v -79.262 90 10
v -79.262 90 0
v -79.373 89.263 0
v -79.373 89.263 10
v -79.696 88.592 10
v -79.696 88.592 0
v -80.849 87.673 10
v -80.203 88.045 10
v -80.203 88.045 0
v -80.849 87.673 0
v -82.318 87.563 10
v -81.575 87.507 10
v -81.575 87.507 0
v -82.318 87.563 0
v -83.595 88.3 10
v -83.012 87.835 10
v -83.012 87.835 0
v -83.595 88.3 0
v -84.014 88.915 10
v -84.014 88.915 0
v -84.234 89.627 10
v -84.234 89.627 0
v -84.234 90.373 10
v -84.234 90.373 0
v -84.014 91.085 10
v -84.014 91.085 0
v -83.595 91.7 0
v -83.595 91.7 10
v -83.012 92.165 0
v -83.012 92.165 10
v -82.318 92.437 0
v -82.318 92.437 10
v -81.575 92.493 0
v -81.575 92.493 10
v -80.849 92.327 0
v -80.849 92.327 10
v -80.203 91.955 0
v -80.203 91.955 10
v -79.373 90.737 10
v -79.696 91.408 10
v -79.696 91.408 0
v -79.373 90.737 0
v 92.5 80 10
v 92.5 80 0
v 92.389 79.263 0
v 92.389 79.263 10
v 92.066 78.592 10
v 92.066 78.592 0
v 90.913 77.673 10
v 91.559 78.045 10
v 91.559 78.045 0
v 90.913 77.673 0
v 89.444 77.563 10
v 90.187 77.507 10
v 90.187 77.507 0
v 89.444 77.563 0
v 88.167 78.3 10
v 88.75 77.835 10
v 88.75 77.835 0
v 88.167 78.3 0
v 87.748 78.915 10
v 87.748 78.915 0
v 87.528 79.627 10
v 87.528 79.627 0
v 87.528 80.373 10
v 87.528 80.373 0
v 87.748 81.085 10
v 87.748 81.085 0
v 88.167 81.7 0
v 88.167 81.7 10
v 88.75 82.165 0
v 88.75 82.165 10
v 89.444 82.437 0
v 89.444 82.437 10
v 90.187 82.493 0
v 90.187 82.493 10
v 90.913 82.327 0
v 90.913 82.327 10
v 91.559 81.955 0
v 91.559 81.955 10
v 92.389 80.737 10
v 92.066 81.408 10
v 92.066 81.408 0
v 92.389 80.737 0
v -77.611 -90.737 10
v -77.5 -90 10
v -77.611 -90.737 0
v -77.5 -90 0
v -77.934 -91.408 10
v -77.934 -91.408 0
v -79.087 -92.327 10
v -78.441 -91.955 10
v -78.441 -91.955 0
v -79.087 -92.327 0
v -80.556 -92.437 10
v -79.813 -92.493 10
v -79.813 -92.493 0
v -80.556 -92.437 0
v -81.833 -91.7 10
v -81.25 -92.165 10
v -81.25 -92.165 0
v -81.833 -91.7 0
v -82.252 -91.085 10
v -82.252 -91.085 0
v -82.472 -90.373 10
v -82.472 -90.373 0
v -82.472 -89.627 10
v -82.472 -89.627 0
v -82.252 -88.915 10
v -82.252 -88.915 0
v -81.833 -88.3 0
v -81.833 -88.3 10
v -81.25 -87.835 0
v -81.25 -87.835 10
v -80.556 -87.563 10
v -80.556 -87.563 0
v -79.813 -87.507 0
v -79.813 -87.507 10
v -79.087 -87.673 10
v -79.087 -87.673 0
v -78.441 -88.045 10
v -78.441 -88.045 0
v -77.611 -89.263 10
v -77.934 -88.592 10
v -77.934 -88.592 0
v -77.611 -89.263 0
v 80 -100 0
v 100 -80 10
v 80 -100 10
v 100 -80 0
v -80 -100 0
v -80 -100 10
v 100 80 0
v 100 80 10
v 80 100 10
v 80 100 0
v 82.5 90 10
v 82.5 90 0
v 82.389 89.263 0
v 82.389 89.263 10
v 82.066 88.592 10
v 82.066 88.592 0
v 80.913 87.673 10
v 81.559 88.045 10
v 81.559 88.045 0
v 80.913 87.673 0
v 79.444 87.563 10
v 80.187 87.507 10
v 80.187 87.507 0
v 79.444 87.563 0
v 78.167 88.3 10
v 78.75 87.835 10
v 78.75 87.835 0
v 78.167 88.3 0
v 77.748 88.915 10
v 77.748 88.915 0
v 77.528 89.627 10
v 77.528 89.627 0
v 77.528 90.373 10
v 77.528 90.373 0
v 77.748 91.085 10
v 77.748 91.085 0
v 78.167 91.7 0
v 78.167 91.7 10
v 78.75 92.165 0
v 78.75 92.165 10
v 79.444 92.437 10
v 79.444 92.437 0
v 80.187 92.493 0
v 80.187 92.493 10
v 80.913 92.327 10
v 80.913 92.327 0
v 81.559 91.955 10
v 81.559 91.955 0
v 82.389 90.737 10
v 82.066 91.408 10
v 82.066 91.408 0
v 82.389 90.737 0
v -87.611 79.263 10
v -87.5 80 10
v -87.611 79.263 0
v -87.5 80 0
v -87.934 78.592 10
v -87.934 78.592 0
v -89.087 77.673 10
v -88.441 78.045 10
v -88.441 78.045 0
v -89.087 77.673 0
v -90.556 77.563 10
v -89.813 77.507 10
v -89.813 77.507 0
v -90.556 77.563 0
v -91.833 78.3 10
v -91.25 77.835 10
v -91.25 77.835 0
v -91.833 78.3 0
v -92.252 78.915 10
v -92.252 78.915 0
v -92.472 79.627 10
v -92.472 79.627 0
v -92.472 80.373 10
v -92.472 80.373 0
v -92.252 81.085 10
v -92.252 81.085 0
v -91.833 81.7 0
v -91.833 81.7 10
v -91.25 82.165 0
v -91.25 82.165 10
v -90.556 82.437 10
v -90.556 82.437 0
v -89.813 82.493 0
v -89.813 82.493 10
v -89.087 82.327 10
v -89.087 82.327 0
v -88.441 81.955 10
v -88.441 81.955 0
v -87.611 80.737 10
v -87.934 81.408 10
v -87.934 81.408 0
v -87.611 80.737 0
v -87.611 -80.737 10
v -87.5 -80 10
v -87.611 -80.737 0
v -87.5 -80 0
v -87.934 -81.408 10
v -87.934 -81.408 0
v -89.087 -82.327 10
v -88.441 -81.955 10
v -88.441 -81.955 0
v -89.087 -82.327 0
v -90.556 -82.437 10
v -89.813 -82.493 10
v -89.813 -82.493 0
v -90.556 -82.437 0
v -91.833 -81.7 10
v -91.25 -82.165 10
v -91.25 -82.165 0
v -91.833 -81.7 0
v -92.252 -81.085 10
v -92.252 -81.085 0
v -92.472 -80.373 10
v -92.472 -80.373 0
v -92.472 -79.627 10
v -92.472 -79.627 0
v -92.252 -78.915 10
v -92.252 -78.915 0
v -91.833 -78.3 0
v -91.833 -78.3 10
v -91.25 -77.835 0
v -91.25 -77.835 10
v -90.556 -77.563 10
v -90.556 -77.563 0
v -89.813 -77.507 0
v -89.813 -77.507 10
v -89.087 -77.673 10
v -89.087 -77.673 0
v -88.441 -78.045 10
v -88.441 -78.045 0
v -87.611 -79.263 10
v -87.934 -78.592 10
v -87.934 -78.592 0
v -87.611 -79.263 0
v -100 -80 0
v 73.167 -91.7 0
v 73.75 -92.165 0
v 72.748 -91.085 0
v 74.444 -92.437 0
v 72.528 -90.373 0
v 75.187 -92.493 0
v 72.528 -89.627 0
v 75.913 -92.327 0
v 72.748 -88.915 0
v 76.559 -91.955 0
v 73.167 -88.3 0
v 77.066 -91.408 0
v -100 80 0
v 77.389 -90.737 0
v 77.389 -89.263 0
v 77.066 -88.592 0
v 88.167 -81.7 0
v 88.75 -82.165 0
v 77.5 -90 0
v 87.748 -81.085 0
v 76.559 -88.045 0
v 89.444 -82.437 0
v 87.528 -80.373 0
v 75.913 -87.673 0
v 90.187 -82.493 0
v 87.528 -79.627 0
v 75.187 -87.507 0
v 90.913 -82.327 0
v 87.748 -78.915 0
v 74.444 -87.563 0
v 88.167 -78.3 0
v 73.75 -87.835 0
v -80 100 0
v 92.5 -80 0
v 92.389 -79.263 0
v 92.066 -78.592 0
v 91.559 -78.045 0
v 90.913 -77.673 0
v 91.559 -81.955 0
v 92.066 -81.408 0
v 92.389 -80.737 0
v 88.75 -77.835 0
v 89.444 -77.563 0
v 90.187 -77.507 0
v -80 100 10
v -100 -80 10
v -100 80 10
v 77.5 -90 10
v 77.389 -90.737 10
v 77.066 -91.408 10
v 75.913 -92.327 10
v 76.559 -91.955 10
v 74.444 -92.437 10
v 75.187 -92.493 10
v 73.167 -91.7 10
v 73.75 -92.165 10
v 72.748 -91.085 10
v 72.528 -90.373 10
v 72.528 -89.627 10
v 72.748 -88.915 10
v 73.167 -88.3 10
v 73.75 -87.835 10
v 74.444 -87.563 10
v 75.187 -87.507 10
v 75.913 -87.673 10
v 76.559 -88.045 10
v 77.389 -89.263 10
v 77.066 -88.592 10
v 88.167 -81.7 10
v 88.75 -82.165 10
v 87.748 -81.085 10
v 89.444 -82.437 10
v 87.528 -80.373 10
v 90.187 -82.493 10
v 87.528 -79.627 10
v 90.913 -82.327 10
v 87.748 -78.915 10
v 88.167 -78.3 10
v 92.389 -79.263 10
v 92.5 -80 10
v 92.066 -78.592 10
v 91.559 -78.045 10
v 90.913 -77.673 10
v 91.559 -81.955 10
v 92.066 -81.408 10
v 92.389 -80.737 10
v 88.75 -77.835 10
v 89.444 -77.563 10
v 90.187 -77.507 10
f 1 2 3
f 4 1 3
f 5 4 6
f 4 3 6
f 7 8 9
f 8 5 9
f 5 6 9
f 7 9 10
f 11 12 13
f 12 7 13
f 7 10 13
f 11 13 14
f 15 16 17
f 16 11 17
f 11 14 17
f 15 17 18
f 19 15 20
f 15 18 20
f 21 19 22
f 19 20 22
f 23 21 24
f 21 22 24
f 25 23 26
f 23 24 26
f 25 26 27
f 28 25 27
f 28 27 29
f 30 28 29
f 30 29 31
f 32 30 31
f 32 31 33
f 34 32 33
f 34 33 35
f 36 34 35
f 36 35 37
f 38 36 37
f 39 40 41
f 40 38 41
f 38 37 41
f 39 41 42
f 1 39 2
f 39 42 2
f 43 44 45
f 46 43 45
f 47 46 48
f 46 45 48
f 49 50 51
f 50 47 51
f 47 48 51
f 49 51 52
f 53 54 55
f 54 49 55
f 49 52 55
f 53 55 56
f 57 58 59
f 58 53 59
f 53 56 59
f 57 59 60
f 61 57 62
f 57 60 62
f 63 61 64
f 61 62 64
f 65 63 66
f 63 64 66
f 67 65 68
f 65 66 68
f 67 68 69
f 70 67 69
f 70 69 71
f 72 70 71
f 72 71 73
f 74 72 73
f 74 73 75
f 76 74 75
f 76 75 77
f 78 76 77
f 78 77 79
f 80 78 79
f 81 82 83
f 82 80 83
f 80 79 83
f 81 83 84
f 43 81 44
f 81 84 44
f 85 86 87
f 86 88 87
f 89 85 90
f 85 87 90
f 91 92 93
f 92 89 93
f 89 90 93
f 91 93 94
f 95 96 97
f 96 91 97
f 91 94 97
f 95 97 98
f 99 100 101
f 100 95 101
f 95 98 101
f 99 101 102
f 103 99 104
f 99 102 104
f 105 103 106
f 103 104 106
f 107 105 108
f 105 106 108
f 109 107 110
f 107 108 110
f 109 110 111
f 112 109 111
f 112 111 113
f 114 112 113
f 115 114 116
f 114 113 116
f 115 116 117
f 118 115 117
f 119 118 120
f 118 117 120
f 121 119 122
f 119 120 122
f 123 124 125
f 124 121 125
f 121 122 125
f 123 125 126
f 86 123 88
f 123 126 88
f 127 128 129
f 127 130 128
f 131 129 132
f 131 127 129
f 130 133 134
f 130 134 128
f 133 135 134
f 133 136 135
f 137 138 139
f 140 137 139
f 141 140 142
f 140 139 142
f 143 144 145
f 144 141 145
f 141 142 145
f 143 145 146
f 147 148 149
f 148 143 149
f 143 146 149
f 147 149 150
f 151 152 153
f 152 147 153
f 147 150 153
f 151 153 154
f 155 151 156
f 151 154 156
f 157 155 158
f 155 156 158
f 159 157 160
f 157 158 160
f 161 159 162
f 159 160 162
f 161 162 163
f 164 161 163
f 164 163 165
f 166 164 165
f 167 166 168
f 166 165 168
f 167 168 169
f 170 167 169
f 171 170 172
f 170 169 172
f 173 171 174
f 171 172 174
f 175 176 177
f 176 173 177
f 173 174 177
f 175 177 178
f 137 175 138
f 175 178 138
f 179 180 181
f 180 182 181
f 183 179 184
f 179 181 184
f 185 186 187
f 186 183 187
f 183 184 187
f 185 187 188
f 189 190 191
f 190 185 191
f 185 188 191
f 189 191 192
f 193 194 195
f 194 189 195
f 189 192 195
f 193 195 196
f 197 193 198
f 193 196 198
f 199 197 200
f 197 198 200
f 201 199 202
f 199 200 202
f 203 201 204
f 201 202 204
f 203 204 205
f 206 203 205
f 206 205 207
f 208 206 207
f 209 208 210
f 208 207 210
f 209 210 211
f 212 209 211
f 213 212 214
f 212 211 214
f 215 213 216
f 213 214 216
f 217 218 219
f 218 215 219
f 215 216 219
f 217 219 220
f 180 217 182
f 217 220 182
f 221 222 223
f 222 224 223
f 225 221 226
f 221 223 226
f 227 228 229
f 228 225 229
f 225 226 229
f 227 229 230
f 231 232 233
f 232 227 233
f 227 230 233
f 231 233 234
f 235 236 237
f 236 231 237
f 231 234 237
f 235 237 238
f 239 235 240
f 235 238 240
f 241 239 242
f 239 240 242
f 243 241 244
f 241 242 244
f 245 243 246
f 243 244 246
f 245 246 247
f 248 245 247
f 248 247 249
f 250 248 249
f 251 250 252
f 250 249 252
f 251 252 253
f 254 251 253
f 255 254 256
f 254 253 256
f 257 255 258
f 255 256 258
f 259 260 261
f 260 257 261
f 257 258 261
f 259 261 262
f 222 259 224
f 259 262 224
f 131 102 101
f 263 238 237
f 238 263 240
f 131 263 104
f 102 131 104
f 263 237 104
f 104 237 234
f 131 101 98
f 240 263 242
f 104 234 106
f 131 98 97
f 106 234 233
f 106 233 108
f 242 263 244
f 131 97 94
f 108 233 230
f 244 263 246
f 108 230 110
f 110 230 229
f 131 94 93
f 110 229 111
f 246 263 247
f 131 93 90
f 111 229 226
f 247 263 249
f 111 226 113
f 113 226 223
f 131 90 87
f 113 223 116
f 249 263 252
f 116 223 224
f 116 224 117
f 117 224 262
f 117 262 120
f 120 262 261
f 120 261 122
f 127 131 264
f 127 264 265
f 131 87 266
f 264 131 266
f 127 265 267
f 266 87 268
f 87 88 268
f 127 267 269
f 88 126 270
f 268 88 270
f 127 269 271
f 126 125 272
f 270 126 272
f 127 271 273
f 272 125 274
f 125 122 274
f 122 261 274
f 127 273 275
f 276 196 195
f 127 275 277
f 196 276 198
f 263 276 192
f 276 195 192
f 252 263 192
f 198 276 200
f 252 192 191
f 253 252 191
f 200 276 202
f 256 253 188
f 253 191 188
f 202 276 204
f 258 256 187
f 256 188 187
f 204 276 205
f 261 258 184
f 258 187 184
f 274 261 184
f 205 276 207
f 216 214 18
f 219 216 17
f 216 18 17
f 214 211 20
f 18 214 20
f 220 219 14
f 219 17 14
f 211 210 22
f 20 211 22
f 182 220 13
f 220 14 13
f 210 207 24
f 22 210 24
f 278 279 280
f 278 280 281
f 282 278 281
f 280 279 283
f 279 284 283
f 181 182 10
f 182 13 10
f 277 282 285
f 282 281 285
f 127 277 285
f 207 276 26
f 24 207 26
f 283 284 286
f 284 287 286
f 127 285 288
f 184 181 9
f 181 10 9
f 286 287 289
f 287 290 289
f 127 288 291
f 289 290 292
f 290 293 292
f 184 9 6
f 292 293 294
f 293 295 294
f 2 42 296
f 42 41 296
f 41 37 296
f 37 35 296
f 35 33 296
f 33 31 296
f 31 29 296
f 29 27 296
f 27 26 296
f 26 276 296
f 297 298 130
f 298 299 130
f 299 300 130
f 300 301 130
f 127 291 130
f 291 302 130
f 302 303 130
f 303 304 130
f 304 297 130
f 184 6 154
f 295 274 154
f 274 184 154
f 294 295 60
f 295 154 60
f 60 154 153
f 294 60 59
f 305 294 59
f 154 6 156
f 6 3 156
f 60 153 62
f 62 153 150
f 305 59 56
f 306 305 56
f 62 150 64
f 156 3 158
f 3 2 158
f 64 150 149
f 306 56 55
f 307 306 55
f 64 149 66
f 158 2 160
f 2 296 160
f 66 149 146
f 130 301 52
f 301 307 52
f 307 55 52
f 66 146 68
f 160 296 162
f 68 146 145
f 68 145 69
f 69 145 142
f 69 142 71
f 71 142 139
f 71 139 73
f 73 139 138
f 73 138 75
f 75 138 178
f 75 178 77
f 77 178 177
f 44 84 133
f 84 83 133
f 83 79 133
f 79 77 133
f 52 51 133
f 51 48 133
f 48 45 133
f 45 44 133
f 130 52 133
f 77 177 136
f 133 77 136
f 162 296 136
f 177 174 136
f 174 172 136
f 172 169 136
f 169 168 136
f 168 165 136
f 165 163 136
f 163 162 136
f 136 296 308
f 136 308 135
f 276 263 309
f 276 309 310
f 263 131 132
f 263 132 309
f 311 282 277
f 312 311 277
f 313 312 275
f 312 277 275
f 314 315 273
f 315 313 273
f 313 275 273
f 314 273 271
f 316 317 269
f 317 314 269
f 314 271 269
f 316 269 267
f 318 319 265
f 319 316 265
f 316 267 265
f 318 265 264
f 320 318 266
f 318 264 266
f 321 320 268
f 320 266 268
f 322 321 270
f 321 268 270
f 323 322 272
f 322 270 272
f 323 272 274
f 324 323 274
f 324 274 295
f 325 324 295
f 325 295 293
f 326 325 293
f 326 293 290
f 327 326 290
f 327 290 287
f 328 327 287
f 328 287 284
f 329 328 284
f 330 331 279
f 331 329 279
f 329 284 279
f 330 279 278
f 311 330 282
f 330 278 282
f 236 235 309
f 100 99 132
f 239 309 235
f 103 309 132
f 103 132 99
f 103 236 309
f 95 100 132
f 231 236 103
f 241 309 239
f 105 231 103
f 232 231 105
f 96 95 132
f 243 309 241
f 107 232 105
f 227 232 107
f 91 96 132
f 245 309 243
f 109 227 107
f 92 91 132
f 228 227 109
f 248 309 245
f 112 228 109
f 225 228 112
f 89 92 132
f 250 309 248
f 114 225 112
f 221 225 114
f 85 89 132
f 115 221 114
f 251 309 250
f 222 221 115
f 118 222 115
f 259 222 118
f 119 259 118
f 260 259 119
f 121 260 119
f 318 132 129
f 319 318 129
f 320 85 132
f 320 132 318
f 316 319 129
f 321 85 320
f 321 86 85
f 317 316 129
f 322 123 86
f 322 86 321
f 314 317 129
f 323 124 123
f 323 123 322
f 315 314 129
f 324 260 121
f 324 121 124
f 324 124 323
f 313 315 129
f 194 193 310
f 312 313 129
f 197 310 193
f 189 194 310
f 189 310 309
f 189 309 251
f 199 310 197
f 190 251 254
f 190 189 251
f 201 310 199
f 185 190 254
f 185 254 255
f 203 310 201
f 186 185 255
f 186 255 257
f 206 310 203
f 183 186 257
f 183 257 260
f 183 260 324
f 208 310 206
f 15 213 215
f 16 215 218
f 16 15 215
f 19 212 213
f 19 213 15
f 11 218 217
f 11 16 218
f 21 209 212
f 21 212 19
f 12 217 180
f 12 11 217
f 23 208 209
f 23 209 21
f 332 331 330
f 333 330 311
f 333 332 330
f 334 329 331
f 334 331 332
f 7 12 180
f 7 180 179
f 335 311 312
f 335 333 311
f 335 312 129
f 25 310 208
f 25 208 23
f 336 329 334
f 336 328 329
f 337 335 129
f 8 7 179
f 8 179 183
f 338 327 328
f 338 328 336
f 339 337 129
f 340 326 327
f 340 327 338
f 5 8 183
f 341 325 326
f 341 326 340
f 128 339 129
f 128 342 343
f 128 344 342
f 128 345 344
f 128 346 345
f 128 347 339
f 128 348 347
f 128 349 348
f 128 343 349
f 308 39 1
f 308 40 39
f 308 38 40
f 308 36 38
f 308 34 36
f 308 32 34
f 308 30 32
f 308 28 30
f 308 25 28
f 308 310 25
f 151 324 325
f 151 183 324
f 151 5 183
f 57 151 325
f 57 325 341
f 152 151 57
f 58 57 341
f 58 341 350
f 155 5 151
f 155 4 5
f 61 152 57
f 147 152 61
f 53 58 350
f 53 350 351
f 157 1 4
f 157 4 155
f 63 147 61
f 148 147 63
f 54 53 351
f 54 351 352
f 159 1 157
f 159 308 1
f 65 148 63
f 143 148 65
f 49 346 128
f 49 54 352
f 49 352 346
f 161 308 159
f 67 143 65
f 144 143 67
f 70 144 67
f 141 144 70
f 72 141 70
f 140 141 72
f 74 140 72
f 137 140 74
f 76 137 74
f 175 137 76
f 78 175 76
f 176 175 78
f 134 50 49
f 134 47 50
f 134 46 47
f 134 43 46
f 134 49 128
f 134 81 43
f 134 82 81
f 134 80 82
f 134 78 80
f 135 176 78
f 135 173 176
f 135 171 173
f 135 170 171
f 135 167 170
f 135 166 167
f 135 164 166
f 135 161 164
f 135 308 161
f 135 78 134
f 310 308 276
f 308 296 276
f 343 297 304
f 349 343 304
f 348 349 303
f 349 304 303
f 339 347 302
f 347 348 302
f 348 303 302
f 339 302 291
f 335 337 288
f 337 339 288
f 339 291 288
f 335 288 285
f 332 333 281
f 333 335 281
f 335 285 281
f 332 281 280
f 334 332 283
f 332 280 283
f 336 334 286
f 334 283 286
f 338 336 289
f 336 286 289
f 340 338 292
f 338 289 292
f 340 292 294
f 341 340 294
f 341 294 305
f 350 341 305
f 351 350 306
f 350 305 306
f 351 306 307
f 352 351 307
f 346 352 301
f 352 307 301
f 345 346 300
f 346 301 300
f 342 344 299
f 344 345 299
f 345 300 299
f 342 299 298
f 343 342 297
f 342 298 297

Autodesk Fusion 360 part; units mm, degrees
sketch "Sketch1" plane through (0, 0, 0) normal (0, 0, 1) x (1, 0, 0)
  line L0 (-80, 100) -> (80, 100)
  line L1 (100, 80) -> (100, -80)
  line L2 (80, -100) -> (-80, -100)
  line L3 (-100, -80) -> (-100, 80)
  line L4 (-80, 100) -> (-100, 80)
  line L5 (80, 100) -> (100, 80)
  line L6 (-80, -100) -> (-100, -80)
  line L7 (100, -80) -> (80, -100)
  circle A0 centre (90, 80) radius 2.5
  circle A1 centre (80, 90) radius 2.5
  circle A2 centre (-81.762, 90) radius 2.5
  circle A3 centre (-90, 80) radius 2.5
  circle A4 centre (-90, -80) radius 2.5
  circle A5 centre (-80, -90) radius 2.5
  circle A6 centre (75, -90) radius 2.5
  circle A7 centre (90, -80) radius 2.5
  point P0 (-100, 100)
  point P1 (100, 100)
  point P2 (100, -100)
  point P3 (-100, -100)
  dimension "d4" = 200
  dimension "d5" = 200
  dimension "d6" = 20
  dimension "d7" = 20
  dimension "d8" = 20
  dimension "d9" = 20
  dimension "d10" = 20
  dimension "d11" = 20
  dimension "d12" = 20
  dimension "d13" = 20
  dimension "d14" = 5
  dimension "d15" = 5
  dimension "d16" = 5
  dimension "d17" = 5
  dimension "d18" = 5
  dimension "d19" = 5
  dimension "d20" = 5
  dimension "d21" = 5
extrude "Extrude2" add sketch "Sketch1" along normal blind 10
extrude "Extrude1" [suppressed]
equation "d7 = d6"
equation "d9 = d8"
equation "d11 = d10"
equation "d13 = d12"
